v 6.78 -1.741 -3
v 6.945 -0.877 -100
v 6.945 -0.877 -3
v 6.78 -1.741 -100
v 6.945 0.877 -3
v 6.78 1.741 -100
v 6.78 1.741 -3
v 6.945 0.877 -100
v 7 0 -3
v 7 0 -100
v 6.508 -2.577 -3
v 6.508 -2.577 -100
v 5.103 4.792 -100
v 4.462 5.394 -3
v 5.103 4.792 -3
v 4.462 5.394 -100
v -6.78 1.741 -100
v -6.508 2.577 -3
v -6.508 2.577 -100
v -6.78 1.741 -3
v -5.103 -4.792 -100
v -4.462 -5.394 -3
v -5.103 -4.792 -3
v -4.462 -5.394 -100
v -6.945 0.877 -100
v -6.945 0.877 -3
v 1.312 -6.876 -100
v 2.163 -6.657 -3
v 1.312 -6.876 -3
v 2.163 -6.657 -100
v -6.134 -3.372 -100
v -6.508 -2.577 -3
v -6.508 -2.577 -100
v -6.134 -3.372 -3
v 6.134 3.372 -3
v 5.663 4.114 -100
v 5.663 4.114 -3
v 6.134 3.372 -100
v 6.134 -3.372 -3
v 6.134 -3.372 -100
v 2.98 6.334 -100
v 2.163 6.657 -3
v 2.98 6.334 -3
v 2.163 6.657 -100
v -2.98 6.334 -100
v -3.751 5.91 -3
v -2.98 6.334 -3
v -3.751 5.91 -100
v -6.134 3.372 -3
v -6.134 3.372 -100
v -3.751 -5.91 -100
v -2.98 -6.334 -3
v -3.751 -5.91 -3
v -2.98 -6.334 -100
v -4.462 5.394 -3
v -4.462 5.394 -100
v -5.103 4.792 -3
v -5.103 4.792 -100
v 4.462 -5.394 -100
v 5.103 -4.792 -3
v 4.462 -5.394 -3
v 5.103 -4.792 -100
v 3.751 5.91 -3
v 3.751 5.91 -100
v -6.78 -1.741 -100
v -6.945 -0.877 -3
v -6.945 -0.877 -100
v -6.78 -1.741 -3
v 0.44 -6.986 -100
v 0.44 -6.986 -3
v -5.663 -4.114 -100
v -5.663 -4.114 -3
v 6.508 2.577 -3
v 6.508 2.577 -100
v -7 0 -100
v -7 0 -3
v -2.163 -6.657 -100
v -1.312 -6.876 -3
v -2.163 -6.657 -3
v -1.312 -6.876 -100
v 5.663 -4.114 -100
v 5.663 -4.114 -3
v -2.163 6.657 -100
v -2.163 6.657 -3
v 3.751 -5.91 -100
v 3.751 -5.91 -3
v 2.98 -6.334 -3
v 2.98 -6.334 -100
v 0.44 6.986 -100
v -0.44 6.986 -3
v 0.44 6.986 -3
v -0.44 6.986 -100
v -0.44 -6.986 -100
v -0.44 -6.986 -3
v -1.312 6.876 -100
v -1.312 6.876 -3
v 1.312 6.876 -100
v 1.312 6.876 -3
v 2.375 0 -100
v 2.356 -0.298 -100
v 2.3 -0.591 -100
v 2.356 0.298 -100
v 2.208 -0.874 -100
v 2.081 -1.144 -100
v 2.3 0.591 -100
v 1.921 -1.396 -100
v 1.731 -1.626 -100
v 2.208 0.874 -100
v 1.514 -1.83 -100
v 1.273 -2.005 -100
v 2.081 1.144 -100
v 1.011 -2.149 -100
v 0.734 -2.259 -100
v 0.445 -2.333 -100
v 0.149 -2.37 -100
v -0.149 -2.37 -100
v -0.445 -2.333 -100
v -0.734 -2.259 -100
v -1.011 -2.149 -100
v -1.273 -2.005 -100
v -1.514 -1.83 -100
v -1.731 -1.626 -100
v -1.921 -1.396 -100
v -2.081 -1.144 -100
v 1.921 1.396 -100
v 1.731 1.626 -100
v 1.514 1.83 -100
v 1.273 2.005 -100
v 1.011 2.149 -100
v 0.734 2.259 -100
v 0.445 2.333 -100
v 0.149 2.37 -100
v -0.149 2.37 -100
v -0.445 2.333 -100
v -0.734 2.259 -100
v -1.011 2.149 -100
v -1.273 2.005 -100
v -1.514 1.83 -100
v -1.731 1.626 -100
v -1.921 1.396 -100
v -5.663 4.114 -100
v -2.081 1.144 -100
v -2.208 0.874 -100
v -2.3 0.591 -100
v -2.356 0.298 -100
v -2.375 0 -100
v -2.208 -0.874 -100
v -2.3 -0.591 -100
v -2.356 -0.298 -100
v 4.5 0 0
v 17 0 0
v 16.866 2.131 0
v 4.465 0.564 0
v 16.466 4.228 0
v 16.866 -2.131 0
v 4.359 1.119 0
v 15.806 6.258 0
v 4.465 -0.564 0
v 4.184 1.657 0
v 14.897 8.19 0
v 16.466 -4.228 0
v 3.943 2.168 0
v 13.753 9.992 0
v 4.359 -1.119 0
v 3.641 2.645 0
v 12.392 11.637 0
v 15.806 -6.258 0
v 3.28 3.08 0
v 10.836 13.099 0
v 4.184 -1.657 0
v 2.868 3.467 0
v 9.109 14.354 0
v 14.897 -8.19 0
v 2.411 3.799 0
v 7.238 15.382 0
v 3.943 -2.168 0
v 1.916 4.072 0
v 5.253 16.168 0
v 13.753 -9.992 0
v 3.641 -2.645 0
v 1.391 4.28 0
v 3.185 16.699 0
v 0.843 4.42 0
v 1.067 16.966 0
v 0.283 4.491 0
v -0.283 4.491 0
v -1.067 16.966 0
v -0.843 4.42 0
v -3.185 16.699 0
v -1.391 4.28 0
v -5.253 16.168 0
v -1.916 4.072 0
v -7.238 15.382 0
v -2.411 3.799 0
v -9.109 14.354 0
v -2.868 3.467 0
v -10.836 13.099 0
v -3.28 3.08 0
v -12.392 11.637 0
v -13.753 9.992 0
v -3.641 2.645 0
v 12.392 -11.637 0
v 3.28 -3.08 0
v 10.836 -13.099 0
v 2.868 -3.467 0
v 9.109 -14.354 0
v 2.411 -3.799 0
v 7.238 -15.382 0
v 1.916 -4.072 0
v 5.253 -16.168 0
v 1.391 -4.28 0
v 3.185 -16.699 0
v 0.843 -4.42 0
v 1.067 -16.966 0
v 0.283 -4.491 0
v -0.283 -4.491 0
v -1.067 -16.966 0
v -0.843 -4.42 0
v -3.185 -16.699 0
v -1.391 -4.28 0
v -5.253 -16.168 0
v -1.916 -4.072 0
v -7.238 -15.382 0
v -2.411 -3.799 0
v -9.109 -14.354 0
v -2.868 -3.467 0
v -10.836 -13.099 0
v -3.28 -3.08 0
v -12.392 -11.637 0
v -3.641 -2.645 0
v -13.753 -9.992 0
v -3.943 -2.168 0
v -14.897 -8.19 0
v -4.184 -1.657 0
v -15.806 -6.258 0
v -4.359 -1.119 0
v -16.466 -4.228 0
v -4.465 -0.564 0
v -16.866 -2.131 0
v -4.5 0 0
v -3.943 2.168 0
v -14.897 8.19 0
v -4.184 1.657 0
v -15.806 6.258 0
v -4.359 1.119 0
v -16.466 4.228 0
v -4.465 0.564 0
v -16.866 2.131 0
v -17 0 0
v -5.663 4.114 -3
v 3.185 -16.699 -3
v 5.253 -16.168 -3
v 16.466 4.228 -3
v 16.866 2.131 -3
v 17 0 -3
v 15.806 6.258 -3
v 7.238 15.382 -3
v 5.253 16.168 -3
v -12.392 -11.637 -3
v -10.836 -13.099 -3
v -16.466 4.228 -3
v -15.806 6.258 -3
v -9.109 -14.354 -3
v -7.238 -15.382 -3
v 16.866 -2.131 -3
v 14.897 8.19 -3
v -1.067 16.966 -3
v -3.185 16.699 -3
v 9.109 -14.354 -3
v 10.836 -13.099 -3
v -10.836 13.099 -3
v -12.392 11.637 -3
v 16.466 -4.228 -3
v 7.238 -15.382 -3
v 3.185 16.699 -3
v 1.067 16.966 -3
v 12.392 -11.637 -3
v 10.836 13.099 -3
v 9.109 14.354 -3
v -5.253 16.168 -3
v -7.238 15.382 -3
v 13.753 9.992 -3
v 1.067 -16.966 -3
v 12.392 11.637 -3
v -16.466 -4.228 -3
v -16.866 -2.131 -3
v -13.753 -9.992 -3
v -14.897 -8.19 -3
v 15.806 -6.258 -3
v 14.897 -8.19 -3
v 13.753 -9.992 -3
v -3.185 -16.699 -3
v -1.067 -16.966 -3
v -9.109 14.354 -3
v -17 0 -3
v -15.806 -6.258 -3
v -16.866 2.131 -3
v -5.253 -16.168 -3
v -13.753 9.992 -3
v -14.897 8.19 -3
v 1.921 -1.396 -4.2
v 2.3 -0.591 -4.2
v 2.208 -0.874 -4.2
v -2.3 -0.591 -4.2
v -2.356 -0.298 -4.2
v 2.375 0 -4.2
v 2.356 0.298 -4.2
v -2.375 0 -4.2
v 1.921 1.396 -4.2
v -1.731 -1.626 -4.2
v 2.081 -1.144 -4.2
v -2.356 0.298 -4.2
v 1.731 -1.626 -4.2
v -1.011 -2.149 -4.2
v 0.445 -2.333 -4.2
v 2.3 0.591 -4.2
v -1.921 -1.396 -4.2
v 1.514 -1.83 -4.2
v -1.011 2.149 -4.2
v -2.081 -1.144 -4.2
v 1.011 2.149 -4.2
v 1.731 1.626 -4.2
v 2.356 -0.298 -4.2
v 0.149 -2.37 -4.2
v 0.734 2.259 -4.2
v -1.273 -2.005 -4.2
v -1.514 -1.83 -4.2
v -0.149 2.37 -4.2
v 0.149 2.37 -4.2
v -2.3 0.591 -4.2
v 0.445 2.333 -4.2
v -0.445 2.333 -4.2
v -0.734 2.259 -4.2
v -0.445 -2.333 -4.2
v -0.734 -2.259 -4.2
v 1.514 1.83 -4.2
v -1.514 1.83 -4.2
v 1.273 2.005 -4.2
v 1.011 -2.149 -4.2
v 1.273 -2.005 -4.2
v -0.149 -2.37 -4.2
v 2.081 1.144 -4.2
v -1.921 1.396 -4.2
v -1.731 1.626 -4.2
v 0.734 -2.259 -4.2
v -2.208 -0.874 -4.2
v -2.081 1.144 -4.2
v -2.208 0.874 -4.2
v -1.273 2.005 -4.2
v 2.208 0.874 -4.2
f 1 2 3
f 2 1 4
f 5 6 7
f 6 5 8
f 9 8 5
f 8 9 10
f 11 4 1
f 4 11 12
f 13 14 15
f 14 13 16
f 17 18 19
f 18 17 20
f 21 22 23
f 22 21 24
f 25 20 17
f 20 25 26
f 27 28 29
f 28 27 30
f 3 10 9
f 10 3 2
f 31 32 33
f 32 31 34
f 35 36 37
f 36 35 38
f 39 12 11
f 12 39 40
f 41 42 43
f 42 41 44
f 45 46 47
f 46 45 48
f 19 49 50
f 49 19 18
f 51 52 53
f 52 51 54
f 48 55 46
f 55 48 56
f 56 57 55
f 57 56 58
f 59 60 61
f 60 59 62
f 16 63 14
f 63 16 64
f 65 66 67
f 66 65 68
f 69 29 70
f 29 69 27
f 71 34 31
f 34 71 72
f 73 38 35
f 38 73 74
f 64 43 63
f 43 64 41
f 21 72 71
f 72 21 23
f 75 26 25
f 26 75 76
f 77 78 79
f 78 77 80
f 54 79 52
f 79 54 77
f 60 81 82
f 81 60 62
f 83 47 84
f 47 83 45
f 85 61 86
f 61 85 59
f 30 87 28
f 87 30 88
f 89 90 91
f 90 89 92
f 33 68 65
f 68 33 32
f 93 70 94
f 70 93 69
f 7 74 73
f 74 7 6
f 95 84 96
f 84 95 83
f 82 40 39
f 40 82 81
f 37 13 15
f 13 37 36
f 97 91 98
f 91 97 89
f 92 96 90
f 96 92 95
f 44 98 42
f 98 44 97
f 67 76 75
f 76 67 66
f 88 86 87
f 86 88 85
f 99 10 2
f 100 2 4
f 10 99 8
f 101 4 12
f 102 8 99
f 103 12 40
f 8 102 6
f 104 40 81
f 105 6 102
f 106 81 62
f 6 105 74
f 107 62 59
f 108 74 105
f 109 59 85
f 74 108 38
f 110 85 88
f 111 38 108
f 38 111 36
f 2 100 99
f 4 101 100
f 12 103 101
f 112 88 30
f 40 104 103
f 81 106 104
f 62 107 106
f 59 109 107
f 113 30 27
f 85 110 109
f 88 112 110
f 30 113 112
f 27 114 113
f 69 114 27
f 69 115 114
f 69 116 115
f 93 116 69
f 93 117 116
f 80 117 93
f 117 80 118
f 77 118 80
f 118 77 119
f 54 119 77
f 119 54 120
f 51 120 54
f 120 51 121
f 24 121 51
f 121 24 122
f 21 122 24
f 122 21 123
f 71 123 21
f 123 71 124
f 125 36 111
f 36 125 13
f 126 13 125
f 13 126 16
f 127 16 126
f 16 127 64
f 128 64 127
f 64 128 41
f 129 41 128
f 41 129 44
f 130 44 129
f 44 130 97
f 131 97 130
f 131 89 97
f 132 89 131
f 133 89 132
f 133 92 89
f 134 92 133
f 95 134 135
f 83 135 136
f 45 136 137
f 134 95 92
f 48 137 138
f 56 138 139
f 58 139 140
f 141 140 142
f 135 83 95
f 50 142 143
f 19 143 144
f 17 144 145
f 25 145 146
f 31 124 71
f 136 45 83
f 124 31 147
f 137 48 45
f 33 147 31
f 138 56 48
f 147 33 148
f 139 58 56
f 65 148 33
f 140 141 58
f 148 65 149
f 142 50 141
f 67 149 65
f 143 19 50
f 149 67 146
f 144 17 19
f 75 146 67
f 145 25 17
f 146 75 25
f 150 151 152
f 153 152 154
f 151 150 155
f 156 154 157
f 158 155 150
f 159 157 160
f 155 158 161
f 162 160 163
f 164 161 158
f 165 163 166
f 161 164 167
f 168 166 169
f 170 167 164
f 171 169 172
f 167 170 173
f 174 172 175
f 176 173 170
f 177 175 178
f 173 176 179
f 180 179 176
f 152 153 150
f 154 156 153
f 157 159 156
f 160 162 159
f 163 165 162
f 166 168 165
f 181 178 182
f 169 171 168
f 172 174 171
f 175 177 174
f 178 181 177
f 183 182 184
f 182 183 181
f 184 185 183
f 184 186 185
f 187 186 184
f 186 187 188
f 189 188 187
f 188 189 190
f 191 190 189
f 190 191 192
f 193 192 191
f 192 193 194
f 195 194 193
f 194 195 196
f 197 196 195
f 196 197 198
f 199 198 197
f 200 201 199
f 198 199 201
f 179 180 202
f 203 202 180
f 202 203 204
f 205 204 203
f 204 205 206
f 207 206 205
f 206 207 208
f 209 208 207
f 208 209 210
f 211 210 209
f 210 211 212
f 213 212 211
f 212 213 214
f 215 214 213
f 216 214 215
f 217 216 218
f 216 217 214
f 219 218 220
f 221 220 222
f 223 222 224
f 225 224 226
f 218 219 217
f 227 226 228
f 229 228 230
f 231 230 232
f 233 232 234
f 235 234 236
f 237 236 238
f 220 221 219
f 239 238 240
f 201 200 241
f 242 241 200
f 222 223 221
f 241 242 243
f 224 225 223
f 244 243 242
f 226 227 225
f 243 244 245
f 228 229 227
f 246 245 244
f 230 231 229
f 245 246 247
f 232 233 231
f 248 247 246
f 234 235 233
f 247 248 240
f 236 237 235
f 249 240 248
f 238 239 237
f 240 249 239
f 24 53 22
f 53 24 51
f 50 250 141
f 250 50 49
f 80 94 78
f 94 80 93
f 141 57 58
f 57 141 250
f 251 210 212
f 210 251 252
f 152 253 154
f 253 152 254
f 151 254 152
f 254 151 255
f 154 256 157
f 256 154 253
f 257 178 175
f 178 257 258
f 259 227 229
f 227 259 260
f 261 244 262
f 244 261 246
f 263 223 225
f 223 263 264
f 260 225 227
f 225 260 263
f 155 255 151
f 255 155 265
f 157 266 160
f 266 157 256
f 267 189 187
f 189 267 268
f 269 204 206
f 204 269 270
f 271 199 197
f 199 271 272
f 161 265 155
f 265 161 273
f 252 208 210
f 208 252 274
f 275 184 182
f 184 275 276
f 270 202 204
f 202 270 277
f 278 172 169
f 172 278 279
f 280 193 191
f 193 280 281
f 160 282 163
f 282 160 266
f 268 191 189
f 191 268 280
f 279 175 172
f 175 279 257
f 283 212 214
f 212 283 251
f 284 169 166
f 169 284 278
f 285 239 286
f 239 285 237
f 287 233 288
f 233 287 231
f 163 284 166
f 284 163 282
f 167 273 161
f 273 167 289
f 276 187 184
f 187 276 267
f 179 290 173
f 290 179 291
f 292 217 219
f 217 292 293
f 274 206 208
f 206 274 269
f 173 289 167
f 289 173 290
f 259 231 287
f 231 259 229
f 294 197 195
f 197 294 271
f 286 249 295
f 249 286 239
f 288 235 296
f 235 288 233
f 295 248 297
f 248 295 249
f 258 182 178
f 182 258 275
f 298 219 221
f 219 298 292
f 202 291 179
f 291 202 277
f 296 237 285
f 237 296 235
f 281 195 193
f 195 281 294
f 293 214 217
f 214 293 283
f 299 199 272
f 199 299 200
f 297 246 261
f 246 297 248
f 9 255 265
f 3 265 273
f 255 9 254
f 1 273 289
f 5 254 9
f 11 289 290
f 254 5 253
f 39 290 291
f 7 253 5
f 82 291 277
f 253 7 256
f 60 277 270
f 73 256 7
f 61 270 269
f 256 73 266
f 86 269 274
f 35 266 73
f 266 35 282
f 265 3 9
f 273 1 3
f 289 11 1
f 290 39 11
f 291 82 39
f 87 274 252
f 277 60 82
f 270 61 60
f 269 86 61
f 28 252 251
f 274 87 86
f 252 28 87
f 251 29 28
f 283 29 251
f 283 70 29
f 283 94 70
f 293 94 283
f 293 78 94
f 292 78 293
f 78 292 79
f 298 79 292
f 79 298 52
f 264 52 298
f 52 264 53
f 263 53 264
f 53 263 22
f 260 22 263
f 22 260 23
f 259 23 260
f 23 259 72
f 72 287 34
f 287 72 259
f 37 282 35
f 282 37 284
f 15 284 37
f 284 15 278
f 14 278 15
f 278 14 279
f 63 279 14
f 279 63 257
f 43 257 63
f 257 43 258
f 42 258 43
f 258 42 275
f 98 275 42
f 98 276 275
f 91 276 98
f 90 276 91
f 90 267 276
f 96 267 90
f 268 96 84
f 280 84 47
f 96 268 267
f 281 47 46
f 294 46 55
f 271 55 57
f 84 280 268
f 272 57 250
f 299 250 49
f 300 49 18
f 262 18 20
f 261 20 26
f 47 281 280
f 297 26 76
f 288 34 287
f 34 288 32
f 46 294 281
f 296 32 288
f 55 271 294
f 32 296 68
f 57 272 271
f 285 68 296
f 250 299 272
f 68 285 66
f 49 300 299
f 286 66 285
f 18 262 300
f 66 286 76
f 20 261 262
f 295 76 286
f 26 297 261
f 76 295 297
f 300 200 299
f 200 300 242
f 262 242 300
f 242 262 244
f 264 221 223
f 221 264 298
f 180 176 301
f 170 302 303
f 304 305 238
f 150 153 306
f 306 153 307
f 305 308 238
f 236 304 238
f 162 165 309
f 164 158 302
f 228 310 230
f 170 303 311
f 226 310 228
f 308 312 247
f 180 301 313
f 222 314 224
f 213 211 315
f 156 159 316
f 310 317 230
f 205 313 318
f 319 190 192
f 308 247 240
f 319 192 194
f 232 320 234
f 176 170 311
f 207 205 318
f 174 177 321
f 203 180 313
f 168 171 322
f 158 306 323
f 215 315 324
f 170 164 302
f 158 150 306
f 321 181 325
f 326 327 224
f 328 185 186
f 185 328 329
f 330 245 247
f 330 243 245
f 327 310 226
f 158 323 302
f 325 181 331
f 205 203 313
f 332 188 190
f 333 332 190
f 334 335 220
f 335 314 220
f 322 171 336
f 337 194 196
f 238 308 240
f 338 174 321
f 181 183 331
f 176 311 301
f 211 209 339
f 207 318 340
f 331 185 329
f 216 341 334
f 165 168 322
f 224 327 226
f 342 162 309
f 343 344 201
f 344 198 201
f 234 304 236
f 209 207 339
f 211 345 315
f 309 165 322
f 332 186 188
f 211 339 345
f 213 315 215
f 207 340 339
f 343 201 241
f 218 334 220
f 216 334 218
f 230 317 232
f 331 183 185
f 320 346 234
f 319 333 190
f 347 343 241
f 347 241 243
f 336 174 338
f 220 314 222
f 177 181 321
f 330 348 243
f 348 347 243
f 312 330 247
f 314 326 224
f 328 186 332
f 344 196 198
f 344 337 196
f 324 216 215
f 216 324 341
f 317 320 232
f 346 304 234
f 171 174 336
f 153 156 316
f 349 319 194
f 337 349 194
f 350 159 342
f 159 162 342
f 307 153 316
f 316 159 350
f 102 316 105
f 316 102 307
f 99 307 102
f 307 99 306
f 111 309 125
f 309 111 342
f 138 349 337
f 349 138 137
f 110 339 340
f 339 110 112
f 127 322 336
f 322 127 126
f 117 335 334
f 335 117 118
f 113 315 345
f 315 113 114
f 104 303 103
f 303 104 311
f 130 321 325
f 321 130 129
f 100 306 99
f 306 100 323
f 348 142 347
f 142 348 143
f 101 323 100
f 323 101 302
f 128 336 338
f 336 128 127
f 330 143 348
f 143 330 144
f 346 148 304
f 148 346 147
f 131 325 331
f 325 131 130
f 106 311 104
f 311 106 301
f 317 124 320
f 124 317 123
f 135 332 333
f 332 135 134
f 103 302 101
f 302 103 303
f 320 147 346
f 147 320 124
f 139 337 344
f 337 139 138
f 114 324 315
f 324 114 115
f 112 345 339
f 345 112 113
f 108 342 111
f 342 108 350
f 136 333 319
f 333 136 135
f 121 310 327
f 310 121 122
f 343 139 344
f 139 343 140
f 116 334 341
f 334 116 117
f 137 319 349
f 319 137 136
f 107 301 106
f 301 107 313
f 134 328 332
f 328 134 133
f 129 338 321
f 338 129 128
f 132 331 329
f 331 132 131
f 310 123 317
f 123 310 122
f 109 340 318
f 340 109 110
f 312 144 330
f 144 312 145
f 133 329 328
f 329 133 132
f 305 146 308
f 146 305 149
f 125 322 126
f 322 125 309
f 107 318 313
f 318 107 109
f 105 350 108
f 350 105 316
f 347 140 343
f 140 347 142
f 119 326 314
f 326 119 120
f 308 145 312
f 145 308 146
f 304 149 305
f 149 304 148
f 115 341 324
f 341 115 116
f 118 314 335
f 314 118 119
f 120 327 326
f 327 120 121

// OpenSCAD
$fn = 50;


difference() {
	union() {
		translate(v = [0, 0, -100.0000000000]) {
			cylinder(h = 100, r = 7.0000000000);
		}
		translate(v = [0, 0, -3.0000000000]) {
			cylinder(h = 3, r = 17.0000000000);
		}
	}
	union() {
		translate(v = [0, 0, 0]) {
			rotate(a = [0, 0, 0]) {
				difference() {
					union() {
						#translate(v = [0, 0, -100.0000000000]) {
							cylinder(h = 100, r = 2.2500000000);
						}
						#translate(v = [0, 0, -4.2000000000]) {
							cylinder(h = 4.2000000000, r1 = 2.3750000000, r2 = 4.5000000000);
						}
						#translate(v = [0, 0, -100.0000000000]) {
							cylinder(h = 100, r = 2.3750000000);
						}
						#translate(v = [0, 0, -100.0000000000]) {
							cylinder(h = 100, r = 2.2500000000);
						}
					}
					union();
				}
			}
		}
	}
}
